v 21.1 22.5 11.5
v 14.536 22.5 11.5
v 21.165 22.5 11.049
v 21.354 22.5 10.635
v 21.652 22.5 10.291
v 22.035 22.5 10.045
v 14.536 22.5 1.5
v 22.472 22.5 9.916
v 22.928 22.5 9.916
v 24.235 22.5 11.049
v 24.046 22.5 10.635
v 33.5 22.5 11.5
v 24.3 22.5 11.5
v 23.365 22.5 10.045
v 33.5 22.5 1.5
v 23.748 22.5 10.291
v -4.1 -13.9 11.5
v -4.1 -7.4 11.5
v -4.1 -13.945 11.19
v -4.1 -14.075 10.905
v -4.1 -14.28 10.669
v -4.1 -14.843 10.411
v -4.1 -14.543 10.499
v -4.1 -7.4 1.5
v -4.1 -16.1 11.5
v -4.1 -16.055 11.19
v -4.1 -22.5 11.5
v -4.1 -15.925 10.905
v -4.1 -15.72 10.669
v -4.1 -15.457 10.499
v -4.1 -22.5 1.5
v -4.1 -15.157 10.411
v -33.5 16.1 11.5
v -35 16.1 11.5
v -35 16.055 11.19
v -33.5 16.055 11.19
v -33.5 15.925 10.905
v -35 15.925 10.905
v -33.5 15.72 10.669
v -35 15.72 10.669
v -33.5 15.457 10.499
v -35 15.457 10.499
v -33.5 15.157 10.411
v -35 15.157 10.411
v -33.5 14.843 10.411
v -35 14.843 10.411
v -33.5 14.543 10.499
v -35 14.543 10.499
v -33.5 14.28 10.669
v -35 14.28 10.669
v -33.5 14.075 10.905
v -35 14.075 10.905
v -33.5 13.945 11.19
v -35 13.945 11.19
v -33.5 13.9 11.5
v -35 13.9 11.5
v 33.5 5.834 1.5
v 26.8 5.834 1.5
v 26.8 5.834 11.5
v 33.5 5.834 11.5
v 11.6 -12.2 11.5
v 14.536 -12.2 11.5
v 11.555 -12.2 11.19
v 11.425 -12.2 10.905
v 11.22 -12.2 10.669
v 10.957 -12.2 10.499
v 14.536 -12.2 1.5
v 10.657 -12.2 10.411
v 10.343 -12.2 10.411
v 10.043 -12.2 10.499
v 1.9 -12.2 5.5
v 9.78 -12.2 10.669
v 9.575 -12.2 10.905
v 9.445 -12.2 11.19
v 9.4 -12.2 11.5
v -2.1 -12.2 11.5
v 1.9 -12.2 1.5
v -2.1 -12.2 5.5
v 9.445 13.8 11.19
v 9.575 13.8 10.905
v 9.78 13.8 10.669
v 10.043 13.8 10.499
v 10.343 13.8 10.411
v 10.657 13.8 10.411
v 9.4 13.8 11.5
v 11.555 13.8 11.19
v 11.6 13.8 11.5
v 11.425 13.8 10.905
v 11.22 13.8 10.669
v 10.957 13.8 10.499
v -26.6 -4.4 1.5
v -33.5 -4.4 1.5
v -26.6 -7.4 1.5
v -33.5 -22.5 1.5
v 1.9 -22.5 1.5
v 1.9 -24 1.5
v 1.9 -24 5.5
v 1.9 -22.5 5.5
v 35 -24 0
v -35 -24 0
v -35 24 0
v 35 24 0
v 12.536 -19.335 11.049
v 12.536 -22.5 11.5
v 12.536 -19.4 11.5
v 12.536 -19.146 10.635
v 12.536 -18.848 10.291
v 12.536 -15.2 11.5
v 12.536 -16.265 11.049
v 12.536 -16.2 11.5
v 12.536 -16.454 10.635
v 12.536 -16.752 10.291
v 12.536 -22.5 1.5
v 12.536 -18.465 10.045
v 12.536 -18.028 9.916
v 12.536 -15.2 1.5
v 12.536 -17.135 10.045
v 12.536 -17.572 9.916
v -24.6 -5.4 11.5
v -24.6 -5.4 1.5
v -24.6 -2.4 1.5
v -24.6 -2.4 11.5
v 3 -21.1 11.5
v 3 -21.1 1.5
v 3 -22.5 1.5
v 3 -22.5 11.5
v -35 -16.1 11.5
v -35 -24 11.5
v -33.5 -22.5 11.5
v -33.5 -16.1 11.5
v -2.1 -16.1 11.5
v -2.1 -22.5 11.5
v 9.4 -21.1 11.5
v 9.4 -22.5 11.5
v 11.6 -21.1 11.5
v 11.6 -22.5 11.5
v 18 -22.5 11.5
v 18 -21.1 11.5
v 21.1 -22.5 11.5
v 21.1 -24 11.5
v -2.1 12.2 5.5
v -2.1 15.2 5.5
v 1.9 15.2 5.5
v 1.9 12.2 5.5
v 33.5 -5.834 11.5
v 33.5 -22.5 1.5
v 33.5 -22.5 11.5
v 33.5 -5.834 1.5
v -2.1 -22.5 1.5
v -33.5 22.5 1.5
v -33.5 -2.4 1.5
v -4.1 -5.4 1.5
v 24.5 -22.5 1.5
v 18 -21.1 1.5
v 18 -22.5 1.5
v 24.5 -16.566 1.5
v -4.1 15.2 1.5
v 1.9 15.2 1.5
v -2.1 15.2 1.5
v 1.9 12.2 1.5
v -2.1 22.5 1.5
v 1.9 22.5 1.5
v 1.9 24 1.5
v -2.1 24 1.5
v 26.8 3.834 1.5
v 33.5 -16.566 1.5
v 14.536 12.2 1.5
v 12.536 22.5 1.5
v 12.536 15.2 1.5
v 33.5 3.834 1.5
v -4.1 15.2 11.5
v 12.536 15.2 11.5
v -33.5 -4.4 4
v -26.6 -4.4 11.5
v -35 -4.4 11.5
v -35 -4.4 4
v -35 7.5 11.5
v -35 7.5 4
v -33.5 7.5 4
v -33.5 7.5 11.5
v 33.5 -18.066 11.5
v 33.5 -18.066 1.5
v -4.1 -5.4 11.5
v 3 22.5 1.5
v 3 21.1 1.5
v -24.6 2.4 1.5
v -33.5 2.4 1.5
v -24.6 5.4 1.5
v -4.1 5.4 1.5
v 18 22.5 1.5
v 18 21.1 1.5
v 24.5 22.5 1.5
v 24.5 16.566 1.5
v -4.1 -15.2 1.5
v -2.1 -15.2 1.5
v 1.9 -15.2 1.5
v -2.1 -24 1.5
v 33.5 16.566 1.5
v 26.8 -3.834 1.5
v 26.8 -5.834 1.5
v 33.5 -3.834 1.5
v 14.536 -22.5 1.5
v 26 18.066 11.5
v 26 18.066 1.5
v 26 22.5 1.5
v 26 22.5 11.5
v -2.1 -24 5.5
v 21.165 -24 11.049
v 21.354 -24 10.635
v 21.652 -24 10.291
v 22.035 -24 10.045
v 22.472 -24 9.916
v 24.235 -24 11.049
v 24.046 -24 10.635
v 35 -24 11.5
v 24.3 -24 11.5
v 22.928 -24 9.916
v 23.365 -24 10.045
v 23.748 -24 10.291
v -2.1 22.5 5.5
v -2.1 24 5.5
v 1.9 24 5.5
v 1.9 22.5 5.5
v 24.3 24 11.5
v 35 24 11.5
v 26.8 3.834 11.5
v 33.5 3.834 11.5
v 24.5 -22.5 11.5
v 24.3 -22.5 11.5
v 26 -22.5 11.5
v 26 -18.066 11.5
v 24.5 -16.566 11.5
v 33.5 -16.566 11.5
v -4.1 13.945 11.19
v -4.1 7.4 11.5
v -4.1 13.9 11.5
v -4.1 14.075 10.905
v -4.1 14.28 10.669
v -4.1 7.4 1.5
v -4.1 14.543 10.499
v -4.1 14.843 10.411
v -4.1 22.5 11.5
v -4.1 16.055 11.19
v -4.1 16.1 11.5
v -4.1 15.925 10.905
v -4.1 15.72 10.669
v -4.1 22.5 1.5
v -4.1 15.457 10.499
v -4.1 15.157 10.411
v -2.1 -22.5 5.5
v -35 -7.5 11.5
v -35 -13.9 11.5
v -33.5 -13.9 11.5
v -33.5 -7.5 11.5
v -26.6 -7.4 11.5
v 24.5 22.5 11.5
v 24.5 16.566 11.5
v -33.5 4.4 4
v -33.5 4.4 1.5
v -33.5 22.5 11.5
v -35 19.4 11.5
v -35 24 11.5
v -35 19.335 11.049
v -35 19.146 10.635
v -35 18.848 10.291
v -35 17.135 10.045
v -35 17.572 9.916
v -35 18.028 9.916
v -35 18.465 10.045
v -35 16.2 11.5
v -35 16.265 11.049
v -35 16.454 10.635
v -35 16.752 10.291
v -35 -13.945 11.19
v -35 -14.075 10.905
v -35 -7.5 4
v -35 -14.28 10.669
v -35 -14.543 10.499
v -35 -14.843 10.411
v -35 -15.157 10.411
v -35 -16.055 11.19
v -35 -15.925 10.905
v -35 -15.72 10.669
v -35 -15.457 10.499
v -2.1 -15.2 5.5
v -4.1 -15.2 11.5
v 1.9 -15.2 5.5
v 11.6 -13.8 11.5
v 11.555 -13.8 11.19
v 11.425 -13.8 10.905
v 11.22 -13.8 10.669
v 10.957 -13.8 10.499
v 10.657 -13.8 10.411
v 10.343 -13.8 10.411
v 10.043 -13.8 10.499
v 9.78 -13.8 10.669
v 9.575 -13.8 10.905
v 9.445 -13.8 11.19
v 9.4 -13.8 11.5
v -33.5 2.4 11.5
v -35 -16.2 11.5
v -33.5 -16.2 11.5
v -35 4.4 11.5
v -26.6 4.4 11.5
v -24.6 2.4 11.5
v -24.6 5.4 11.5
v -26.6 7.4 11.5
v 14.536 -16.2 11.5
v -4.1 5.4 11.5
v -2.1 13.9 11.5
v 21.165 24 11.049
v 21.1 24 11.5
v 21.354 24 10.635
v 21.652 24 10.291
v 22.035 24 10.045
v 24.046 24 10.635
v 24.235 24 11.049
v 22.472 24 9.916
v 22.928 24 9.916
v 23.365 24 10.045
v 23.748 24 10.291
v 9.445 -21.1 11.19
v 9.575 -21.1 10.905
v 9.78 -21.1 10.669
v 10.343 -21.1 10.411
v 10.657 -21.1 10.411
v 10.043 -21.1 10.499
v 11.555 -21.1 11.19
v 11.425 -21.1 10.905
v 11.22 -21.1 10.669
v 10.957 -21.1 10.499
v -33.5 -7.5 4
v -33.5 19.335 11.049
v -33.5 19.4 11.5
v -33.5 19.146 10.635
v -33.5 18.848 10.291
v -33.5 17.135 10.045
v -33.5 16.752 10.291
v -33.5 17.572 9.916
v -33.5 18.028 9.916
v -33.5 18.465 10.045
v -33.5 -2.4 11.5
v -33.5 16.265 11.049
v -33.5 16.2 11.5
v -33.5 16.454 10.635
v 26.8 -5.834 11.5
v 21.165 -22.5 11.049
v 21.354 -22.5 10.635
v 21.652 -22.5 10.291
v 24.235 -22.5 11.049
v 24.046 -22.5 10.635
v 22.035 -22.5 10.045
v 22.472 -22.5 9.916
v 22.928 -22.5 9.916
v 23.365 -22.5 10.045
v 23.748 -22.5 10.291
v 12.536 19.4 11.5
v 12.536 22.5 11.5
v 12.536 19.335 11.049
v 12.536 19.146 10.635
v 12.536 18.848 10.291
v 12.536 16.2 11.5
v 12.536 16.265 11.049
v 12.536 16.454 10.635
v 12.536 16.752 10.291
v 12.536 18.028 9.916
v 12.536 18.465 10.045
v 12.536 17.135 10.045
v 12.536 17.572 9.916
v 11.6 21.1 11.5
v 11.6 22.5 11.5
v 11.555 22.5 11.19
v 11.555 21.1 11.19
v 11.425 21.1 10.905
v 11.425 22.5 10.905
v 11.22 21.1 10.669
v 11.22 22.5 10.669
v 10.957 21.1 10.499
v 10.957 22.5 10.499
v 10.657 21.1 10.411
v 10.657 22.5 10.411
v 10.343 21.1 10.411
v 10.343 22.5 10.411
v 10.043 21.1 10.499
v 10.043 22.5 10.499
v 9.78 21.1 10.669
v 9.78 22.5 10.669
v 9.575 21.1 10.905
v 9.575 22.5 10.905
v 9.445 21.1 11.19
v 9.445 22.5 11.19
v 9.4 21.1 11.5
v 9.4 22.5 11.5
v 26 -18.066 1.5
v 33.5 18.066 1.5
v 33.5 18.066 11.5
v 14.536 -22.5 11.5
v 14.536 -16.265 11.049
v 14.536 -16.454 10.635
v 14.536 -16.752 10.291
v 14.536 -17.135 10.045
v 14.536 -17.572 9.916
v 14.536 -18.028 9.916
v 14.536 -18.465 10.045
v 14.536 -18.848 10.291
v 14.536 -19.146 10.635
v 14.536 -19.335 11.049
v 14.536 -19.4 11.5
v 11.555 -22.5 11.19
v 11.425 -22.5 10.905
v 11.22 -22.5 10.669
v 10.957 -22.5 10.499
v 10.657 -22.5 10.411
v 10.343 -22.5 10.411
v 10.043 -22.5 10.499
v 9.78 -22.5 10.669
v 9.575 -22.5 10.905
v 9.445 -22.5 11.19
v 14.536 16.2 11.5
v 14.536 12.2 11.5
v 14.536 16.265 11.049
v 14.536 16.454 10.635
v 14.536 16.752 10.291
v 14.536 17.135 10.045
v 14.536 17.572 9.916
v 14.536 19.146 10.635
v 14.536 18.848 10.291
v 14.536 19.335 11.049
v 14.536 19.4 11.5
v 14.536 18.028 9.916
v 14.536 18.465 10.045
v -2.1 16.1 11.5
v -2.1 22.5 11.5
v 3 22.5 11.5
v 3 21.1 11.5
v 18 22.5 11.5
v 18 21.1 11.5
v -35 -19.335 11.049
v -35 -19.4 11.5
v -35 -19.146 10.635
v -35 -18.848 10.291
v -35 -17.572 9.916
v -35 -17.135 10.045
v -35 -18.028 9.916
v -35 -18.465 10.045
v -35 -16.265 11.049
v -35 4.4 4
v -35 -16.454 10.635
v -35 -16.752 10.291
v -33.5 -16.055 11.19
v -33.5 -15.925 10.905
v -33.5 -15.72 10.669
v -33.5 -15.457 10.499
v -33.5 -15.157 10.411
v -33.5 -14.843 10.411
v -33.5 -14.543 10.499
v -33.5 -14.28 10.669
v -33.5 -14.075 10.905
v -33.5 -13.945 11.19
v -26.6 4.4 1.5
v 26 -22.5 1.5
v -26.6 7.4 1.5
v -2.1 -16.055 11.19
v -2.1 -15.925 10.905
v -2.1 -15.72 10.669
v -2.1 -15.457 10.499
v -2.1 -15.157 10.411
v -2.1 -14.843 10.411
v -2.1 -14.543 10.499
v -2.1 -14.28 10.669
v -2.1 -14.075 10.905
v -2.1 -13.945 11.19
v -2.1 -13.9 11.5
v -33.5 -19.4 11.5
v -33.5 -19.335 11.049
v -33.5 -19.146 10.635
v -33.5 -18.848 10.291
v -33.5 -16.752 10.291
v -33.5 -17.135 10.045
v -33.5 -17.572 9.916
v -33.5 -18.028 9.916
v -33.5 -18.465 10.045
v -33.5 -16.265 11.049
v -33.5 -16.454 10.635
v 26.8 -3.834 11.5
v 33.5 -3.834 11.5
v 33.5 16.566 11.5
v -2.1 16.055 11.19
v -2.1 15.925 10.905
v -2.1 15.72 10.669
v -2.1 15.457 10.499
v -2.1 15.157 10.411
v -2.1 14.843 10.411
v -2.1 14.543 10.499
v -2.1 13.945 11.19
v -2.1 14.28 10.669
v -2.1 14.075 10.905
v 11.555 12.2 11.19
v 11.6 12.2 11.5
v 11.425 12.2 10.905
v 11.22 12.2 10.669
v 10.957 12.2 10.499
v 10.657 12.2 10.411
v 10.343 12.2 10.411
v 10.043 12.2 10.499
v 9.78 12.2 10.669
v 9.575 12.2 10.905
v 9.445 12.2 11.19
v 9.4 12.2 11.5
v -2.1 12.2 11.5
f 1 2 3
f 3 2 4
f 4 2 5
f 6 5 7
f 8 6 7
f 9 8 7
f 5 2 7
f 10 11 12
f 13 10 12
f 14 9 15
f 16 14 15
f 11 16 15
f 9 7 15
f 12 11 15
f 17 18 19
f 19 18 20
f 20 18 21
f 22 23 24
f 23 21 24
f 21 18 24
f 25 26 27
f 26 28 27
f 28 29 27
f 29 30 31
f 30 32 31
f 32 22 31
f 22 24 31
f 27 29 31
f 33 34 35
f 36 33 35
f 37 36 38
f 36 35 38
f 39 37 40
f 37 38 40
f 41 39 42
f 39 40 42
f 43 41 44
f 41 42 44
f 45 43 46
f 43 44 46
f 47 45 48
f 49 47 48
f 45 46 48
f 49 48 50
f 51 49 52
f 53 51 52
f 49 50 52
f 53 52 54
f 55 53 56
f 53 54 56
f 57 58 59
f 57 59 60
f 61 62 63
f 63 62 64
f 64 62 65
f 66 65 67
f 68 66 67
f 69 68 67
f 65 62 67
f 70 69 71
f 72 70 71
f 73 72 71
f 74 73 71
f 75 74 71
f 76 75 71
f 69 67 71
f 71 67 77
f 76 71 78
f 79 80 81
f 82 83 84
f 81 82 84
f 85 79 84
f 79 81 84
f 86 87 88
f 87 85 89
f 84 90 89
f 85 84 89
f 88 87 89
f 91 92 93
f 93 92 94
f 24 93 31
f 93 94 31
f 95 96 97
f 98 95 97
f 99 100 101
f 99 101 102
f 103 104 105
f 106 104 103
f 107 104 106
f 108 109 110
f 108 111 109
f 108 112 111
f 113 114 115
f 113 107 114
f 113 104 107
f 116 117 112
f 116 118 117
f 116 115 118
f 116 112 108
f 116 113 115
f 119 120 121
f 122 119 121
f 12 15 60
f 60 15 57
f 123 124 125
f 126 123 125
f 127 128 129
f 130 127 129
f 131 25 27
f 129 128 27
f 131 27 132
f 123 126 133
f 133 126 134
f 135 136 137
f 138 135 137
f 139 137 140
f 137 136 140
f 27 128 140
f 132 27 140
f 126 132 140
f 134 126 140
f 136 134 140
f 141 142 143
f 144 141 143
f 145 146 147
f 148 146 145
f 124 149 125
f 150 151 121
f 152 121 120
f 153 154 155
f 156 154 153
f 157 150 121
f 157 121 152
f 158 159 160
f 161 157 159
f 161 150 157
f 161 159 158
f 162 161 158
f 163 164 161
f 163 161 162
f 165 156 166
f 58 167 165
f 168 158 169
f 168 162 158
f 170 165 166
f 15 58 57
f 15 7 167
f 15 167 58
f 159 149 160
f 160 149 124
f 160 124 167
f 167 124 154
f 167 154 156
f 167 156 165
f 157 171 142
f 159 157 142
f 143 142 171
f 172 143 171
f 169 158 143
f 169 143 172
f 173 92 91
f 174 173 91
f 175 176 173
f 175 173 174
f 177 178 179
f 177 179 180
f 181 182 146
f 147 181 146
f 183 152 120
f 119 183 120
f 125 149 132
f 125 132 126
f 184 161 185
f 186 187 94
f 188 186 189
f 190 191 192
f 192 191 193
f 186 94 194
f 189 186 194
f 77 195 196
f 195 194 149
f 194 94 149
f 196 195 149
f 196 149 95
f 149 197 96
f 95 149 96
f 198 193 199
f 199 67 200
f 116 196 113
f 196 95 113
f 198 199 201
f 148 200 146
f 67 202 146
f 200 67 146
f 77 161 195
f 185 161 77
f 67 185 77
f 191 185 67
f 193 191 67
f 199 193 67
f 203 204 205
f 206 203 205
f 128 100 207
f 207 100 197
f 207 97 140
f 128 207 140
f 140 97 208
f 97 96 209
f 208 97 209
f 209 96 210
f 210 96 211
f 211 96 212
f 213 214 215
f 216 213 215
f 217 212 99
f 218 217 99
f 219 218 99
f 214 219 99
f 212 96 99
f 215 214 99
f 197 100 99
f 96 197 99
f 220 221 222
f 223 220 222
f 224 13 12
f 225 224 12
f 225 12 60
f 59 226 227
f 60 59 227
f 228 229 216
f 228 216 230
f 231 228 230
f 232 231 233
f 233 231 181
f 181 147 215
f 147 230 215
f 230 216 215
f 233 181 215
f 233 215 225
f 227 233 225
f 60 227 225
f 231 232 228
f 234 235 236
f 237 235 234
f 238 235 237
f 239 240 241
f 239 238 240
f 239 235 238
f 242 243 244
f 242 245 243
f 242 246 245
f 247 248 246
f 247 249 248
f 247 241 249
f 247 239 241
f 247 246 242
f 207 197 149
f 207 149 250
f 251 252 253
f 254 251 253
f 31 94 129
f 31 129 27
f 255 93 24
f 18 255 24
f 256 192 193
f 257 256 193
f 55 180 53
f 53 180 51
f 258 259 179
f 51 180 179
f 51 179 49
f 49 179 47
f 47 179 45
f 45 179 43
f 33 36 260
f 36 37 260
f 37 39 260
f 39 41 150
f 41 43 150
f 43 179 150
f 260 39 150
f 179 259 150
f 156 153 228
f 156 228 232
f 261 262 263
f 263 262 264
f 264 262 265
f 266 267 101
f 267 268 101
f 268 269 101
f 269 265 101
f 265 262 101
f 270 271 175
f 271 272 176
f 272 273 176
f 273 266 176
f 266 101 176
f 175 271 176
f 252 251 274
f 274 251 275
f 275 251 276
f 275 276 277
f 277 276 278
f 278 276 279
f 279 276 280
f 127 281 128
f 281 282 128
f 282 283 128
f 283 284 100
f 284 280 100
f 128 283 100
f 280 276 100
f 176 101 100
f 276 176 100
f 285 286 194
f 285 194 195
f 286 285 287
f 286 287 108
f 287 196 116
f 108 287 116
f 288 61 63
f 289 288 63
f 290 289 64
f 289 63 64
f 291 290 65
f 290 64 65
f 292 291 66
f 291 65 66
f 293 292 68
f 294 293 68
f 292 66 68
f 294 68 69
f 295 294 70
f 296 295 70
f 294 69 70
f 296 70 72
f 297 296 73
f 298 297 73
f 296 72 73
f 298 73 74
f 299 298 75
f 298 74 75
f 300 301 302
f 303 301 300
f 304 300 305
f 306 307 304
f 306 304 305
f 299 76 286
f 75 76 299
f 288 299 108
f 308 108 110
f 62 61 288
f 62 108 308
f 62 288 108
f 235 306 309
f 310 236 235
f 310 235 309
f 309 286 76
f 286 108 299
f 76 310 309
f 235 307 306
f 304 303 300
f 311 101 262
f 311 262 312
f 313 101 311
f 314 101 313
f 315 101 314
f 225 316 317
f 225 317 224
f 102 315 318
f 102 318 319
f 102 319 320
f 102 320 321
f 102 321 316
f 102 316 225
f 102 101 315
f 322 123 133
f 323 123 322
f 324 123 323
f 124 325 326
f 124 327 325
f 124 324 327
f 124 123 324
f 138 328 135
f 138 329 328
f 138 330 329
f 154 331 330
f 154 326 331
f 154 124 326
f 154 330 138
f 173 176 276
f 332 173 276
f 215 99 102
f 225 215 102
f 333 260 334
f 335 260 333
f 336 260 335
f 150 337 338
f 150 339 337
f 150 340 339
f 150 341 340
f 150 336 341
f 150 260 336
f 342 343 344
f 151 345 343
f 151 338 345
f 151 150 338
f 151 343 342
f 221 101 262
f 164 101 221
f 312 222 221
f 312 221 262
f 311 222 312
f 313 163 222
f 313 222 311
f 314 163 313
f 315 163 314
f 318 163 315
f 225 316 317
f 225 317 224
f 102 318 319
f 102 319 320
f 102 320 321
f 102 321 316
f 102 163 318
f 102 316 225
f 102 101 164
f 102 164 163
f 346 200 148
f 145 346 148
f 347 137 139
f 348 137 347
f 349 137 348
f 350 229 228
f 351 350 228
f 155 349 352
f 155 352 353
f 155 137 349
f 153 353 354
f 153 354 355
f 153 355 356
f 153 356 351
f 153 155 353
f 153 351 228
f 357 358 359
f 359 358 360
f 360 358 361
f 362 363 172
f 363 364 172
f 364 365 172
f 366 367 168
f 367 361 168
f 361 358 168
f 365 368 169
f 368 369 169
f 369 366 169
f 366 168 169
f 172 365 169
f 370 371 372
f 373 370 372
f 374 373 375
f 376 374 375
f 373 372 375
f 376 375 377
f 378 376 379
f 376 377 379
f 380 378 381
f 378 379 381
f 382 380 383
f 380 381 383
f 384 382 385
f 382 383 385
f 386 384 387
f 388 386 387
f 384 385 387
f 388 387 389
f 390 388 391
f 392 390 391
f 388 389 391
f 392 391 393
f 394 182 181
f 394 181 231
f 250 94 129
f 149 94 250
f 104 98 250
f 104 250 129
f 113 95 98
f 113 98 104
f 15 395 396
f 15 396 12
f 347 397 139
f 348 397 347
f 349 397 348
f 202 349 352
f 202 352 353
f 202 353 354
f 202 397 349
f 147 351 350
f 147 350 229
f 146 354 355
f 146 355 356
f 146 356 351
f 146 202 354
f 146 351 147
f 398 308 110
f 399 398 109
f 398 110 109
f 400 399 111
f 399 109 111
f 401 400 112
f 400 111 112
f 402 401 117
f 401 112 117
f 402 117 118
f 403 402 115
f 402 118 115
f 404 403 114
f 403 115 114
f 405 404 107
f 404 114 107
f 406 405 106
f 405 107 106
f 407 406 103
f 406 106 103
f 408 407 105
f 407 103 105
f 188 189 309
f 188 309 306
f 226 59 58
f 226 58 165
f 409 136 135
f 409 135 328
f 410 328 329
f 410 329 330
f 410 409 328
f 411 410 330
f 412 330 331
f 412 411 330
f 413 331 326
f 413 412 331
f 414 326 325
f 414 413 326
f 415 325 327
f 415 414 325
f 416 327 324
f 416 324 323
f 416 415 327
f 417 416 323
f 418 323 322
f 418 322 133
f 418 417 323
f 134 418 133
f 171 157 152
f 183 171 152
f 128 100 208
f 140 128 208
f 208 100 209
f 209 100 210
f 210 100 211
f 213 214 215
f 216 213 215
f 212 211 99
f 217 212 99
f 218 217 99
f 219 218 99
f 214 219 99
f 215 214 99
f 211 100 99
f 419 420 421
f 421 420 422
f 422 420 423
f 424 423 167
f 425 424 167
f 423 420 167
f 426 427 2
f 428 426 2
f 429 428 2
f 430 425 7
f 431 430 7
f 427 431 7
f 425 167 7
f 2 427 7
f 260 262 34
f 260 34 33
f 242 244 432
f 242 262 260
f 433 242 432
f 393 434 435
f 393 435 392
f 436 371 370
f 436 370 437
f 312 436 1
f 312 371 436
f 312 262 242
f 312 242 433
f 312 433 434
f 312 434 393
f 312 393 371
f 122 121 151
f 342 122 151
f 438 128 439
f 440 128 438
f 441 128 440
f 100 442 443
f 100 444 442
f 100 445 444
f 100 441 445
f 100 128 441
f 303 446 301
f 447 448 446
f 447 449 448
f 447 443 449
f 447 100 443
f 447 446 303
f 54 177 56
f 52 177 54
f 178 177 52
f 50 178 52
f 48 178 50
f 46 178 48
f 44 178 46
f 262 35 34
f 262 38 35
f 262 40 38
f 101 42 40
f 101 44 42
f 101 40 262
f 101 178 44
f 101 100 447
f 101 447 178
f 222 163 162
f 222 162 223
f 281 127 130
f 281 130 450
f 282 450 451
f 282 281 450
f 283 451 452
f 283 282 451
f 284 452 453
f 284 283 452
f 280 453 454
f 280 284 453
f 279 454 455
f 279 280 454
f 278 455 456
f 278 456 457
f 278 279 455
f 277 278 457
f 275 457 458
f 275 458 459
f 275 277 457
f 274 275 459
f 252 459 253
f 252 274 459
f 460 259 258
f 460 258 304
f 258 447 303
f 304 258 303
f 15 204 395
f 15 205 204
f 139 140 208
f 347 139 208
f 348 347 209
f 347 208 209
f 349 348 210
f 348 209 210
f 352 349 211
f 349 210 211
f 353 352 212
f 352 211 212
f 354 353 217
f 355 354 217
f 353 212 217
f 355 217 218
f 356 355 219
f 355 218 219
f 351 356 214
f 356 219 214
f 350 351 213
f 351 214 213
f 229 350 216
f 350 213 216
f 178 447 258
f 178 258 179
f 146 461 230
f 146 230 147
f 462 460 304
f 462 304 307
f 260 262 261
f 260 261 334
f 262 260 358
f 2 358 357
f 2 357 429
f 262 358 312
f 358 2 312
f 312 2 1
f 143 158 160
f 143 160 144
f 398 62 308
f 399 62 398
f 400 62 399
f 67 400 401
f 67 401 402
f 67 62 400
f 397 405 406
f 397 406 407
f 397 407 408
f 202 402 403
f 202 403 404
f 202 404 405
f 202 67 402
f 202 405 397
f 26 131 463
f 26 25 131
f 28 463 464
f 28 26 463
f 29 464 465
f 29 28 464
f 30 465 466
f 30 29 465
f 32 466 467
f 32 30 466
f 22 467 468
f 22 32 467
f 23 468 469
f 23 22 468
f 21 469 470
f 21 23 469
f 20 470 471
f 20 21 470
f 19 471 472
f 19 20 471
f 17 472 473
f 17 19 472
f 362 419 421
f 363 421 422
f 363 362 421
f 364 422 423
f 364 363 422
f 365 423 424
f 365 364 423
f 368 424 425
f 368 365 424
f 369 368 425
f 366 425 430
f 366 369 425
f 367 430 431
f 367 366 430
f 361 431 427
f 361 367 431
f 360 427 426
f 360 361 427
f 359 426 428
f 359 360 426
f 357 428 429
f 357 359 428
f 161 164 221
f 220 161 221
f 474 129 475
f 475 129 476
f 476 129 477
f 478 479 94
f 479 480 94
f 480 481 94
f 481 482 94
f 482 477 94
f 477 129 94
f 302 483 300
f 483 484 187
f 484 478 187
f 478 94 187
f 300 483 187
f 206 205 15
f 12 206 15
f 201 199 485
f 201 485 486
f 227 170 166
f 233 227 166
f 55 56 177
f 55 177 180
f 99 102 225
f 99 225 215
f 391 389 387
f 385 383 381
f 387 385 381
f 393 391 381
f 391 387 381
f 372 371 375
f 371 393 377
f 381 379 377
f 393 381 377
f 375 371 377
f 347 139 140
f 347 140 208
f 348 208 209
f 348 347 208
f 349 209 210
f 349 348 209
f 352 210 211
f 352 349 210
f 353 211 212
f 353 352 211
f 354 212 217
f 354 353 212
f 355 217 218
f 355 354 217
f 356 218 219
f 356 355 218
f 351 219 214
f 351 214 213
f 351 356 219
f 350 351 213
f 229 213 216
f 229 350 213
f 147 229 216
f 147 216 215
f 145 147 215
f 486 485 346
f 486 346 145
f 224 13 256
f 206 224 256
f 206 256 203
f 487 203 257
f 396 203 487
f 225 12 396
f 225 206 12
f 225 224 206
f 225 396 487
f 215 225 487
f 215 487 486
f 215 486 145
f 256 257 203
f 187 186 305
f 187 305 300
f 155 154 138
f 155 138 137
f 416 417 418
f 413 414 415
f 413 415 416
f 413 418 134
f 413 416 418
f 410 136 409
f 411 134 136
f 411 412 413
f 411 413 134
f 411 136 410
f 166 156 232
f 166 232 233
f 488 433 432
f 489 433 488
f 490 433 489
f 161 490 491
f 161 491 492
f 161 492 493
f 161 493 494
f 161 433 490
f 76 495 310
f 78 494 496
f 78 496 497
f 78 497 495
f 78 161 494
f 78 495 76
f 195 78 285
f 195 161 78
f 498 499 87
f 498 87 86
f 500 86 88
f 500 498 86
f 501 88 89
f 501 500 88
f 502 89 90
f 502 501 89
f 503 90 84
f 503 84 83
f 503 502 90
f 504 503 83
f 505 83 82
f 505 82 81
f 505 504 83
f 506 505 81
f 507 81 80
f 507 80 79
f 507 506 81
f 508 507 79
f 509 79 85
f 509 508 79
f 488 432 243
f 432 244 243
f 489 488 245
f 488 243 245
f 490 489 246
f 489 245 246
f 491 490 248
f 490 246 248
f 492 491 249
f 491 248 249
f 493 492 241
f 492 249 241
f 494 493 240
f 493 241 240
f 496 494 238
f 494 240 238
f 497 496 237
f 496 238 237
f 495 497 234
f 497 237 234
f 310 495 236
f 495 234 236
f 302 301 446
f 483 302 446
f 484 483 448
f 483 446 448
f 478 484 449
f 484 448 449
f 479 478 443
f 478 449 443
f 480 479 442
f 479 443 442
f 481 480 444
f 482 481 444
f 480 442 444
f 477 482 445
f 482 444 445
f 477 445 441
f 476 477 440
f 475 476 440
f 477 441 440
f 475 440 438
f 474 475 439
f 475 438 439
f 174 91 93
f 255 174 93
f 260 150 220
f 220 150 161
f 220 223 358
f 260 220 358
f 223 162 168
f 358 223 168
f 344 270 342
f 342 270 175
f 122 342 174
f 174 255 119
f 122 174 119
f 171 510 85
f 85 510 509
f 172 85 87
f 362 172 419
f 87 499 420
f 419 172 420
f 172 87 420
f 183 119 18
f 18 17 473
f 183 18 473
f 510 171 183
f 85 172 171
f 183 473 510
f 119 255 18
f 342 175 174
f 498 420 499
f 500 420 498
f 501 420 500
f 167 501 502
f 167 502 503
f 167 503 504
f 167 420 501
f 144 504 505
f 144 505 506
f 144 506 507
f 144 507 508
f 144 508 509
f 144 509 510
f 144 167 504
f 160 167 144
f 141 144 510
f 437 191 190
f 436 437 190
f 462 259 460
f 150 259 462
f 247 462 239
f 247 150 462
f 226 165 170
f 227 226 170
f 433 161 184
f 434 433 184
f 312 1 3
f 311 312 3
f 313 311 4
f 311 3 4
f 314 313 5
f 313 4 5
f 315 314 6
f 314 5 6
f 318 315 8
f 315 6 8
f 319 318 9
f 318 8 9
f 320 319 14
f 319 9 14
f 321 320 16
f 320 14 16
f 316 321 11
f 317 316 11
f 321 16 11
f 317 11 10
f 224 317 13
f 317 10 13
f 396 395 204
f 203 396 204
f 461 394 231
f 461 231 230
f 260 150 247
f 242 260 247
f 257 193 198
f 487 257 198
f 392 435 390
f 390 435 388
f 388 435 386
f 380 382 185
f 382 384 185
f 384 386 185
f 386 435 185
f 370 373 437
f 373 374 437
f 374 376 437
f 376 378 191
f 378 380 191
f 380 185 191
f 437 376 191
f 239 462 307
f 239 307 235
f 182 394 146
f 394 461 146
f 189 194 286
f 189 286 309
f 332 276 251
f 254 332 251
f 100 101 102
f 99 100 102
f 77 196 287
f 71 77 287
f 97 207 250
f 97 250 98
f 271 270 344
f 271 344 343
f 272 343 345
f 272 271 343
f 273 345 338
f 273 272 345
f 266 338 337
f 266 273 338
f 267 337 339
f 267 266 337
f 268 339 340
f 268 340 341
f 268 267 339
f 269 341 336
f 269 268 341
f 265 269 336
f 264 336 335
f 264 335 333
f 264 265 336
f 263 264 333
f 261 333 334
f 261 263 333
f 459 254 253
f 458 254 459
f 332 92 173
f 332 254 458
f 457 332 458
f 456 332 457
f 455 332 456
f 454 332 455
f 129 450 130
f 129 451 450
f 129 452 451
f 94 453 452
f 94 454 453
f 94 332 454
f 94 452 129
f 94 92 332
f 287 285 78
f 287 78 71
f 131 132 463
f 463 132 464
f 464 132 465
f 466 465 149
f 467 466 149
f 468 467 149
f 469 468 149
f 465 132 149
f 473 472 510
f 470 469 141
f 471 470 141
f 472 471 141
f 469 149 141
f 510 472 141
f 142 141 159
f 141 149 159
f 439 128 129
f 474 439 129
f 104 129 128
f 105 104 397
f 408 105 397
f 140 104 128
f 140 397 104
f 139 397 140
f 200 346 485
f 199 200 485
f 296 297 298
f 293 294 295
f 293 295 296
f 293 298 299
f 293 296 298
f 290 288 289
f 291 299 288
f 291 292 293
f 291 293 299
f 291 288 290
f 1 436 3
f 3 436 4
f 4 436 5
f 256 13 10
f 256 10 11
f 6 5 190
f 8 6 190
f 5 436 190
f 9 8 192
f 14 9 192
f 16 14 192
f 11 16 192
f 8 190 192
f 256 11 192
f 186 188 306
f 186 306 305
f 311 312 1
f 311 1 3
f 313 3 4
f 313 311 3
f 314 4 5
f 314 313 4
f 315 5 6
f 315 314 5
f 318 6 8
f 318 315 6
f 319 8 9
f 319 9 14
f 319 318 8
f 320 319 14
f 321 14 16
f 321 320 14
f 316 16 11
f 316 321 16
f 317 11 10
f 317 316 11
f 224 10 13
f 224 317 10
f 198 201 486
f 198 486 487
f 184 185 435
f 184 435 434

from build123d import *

# Parameters (mm, degrees)
SKETCH_1_W          = 70
SKETCH_1_H          = 48
EXTRUDE_1_DEPTH     = 11.5
SHELL_1_T           = -1.5
SKETCH_2_W          = 15
SKETCH_2_H          = 1.4
SKETCH_2_W_2        = 6.7
SKETCH_2_H_2        = 2
EXTRUDE_2_DEPTH     = 10
SKETCH_3_W          = 4
SKETCH_3_H          = 4
CUT_EXTRUDE_1_DEPTH = 20
SKETCH_4_R          = 1.6
CUT_EXTRUDE_2_DEPTH = 61.508263898
CUT_EXTRUDE_3_REACH = 76.888
SKETCH_5_R          = 1.6
SKETCH_5_R_2        = 1.1
CUT_EXTRUDE_START   = -1.5
SKETCH_6_R          = 1.1
CUT_EXTRUDE_4_DEPTH = 36.3
CUT_EXTRUDE_5_REACH = 76.888
SKETCH_8_W          = 7.5
SKETCH_8_H          = 3.1


with BuildPart() as part:
    # 草图1 → 凸台-拉伸1 (new body)
    with BuildSketch(Plane.XY):
        Rectangle(SKETCH_1_W, SKETCH_1_H)
    extrude(amount=EXTRUDE_1_DEPTH)

    # 抽壳1
    shell_1_openings = [part.faces().sort_by_distance(p)[0] for p in [
        (0, 0, 11.5),
    ]]
    offset(amount=SHELL_1_T, openings=shell_1_openings, kind=Kind.INTERSECTION)

    # 草图2 → 凸台-拉伸2 (add)
    with BuildSketch(Plane.XY.offset(1.5)):
        Polygon((-26.6, 7.4), (-4.1, 7.4), (-4.1, 22.5), (-2.1, 22.5), (-2.1, -12.2), (6.455957795, -12.2), (14.535957795, -12.2), (14.535957795, -22.5), (12.535957795, -22.5), (12.535957795, -15.2), (8.455957795, -15.2), (-4.1, -15.2), (-4.1, 5.4), (-24.6, 5.4), (-24.6, 2.4), (-33.5, 2.4), (-33.5, 4.4), (-26.6, 4.4), align=None)
        with Locations((10.5, 21.8)):
            Rectangle(SKETCH_2_W, SKETCH_2_H)
        Polygon((24.5, 22.5), (24.5, 16.56560625), (33.5, 16.56560625), (33.5, 18.06560625), (26, 18.06560625), (26, 22.5), align=None)
        with Locations((30.15, -4.83439375)):
            Rectangle(SKETCH_2_W_2, SKETCH_2_H_2)
    extrude(amount=EXTRUDE_2_DEPTH)

    # 草图3 → 切除-拉伸1 (cut)
    with BuildSketch(Plane.XZ.offset(24)):
        with Locations((-0.1, 3.5)):
            Rectangle(SKETCH_3_W, SKETCH_3_H)
    extrude(amount=-CUT_EXTRUDE_1_DEPTH, mode=Mode.SUBTRACT)

    # 草图4 → 切除-拉伸2 (cut, through all)
    with BuildSketch(Plane.XZ.offset(24)):
        with Locations((22.7, 11.5)):
            Circle(SKETCH_4_R)
    extrude(amount=-CUT_EXTRUDE_2_DEPTH, mode=Mode.SUBTRACT)

    # 切除-拉伸3: up to this face of the body (flat: up to its plane)
    cut_extrude_3_end = Plane(part.part.faces().sort_by_distance((14.535957795, -17.35, 6.5))[0])
    # 草图5 → 切除-拉伸3 (cut, up to the picked face)
    with BuildSketch(Plane.ZY.offset(35), mode=Mode.PRIVATE) as cut_extrude_3_sk1:
        with Locations((11.5, -17.8)):
            Circle(SKETCH_5_R)
    cut_extrude_3_tool1 = split(extrude(cut_extrude_3_sk1.sketch, amount=-CUT_EXTRUDE_3_REACH, mode=Mode.PRIVATE), bisect_by=cut_extrude_3_end, keep=Keep.BOTH, mode=Mode.PRIVATE)
    # 草图5 → 切除-拉伸3 (cut, up to the picked face)
    with BuildSketch(Plane.ZY.offset(35), mode=Mode.PRIVATE) as cut_extrude_3_sk2:
        with Locations((11.5, 15)):
            Circle(SKETCH_5_R_2)
    cut_extrude_3_tool2 = split(extrude(cut_extrude_3_sk2.sketch, amount=-CUT_EXTRUDE_3_REACH, mode=Mode.PRIVATE), bisect_by=cut_extrude_3_end, keep=Keep.BOTH, mode=Mode.PRIVATE)
    add(cut_extrude_3_tool1.solids().sort_by(Axis((-35, -17.8, 11.5), (1, 0, 0)))[0], mode=Mode.SUBTRACT)
    add(cut_extrude_3_tool2.solids().sort_by(Axis((-35, 15, 11.5), (1, 0, 0)))[0], mode=Mode.SUBTRACT)

    # 草图6 → 切除-拉伸4 (cut)
    with BuildSketch(Plane(origin=(0, 24, 0), x_dir=(1, 0, 0), z_dir=(0, 1, 0)).offset(CUT_EXTRUDE_START)):
        with Locations((10.5, -11.5)):
            Circle(SKETCH_6_R)
    extrude(amount=-CUT_EXTRUDE_4_DEPTH, mode=Mode.SUBTRACT)

    # 草图8 → 切除-拉伸5 (cut, up to next)
    with BuildSketch(Plane.ZY.offset(35), mode=Mode.PRIVATE) as cut_extrude_5_sk1:
        with Locations((7.75, 5.95)):
            Rectangle(SKETCH_8_W, SKETCH_8_H)
    cut_extrude_5_tool1 = extrude(cut_extrude_5_sk1.sketch, amount=-CUT_EXTRUDE_5_REACH, mode=Mode.PRIVATE) & part.part
    add(cut_extrude_5_tool1.solids().sort_by_distance((-35, 5.95, 7.75))[0], mode=Mode.SUBTRACT)


with BuildPart() as body_2:
    # 镜向1: mirrored copy
    add(part.part.mirror(Plane.ZX))


solid = Compound([part.part, body_2.part])
